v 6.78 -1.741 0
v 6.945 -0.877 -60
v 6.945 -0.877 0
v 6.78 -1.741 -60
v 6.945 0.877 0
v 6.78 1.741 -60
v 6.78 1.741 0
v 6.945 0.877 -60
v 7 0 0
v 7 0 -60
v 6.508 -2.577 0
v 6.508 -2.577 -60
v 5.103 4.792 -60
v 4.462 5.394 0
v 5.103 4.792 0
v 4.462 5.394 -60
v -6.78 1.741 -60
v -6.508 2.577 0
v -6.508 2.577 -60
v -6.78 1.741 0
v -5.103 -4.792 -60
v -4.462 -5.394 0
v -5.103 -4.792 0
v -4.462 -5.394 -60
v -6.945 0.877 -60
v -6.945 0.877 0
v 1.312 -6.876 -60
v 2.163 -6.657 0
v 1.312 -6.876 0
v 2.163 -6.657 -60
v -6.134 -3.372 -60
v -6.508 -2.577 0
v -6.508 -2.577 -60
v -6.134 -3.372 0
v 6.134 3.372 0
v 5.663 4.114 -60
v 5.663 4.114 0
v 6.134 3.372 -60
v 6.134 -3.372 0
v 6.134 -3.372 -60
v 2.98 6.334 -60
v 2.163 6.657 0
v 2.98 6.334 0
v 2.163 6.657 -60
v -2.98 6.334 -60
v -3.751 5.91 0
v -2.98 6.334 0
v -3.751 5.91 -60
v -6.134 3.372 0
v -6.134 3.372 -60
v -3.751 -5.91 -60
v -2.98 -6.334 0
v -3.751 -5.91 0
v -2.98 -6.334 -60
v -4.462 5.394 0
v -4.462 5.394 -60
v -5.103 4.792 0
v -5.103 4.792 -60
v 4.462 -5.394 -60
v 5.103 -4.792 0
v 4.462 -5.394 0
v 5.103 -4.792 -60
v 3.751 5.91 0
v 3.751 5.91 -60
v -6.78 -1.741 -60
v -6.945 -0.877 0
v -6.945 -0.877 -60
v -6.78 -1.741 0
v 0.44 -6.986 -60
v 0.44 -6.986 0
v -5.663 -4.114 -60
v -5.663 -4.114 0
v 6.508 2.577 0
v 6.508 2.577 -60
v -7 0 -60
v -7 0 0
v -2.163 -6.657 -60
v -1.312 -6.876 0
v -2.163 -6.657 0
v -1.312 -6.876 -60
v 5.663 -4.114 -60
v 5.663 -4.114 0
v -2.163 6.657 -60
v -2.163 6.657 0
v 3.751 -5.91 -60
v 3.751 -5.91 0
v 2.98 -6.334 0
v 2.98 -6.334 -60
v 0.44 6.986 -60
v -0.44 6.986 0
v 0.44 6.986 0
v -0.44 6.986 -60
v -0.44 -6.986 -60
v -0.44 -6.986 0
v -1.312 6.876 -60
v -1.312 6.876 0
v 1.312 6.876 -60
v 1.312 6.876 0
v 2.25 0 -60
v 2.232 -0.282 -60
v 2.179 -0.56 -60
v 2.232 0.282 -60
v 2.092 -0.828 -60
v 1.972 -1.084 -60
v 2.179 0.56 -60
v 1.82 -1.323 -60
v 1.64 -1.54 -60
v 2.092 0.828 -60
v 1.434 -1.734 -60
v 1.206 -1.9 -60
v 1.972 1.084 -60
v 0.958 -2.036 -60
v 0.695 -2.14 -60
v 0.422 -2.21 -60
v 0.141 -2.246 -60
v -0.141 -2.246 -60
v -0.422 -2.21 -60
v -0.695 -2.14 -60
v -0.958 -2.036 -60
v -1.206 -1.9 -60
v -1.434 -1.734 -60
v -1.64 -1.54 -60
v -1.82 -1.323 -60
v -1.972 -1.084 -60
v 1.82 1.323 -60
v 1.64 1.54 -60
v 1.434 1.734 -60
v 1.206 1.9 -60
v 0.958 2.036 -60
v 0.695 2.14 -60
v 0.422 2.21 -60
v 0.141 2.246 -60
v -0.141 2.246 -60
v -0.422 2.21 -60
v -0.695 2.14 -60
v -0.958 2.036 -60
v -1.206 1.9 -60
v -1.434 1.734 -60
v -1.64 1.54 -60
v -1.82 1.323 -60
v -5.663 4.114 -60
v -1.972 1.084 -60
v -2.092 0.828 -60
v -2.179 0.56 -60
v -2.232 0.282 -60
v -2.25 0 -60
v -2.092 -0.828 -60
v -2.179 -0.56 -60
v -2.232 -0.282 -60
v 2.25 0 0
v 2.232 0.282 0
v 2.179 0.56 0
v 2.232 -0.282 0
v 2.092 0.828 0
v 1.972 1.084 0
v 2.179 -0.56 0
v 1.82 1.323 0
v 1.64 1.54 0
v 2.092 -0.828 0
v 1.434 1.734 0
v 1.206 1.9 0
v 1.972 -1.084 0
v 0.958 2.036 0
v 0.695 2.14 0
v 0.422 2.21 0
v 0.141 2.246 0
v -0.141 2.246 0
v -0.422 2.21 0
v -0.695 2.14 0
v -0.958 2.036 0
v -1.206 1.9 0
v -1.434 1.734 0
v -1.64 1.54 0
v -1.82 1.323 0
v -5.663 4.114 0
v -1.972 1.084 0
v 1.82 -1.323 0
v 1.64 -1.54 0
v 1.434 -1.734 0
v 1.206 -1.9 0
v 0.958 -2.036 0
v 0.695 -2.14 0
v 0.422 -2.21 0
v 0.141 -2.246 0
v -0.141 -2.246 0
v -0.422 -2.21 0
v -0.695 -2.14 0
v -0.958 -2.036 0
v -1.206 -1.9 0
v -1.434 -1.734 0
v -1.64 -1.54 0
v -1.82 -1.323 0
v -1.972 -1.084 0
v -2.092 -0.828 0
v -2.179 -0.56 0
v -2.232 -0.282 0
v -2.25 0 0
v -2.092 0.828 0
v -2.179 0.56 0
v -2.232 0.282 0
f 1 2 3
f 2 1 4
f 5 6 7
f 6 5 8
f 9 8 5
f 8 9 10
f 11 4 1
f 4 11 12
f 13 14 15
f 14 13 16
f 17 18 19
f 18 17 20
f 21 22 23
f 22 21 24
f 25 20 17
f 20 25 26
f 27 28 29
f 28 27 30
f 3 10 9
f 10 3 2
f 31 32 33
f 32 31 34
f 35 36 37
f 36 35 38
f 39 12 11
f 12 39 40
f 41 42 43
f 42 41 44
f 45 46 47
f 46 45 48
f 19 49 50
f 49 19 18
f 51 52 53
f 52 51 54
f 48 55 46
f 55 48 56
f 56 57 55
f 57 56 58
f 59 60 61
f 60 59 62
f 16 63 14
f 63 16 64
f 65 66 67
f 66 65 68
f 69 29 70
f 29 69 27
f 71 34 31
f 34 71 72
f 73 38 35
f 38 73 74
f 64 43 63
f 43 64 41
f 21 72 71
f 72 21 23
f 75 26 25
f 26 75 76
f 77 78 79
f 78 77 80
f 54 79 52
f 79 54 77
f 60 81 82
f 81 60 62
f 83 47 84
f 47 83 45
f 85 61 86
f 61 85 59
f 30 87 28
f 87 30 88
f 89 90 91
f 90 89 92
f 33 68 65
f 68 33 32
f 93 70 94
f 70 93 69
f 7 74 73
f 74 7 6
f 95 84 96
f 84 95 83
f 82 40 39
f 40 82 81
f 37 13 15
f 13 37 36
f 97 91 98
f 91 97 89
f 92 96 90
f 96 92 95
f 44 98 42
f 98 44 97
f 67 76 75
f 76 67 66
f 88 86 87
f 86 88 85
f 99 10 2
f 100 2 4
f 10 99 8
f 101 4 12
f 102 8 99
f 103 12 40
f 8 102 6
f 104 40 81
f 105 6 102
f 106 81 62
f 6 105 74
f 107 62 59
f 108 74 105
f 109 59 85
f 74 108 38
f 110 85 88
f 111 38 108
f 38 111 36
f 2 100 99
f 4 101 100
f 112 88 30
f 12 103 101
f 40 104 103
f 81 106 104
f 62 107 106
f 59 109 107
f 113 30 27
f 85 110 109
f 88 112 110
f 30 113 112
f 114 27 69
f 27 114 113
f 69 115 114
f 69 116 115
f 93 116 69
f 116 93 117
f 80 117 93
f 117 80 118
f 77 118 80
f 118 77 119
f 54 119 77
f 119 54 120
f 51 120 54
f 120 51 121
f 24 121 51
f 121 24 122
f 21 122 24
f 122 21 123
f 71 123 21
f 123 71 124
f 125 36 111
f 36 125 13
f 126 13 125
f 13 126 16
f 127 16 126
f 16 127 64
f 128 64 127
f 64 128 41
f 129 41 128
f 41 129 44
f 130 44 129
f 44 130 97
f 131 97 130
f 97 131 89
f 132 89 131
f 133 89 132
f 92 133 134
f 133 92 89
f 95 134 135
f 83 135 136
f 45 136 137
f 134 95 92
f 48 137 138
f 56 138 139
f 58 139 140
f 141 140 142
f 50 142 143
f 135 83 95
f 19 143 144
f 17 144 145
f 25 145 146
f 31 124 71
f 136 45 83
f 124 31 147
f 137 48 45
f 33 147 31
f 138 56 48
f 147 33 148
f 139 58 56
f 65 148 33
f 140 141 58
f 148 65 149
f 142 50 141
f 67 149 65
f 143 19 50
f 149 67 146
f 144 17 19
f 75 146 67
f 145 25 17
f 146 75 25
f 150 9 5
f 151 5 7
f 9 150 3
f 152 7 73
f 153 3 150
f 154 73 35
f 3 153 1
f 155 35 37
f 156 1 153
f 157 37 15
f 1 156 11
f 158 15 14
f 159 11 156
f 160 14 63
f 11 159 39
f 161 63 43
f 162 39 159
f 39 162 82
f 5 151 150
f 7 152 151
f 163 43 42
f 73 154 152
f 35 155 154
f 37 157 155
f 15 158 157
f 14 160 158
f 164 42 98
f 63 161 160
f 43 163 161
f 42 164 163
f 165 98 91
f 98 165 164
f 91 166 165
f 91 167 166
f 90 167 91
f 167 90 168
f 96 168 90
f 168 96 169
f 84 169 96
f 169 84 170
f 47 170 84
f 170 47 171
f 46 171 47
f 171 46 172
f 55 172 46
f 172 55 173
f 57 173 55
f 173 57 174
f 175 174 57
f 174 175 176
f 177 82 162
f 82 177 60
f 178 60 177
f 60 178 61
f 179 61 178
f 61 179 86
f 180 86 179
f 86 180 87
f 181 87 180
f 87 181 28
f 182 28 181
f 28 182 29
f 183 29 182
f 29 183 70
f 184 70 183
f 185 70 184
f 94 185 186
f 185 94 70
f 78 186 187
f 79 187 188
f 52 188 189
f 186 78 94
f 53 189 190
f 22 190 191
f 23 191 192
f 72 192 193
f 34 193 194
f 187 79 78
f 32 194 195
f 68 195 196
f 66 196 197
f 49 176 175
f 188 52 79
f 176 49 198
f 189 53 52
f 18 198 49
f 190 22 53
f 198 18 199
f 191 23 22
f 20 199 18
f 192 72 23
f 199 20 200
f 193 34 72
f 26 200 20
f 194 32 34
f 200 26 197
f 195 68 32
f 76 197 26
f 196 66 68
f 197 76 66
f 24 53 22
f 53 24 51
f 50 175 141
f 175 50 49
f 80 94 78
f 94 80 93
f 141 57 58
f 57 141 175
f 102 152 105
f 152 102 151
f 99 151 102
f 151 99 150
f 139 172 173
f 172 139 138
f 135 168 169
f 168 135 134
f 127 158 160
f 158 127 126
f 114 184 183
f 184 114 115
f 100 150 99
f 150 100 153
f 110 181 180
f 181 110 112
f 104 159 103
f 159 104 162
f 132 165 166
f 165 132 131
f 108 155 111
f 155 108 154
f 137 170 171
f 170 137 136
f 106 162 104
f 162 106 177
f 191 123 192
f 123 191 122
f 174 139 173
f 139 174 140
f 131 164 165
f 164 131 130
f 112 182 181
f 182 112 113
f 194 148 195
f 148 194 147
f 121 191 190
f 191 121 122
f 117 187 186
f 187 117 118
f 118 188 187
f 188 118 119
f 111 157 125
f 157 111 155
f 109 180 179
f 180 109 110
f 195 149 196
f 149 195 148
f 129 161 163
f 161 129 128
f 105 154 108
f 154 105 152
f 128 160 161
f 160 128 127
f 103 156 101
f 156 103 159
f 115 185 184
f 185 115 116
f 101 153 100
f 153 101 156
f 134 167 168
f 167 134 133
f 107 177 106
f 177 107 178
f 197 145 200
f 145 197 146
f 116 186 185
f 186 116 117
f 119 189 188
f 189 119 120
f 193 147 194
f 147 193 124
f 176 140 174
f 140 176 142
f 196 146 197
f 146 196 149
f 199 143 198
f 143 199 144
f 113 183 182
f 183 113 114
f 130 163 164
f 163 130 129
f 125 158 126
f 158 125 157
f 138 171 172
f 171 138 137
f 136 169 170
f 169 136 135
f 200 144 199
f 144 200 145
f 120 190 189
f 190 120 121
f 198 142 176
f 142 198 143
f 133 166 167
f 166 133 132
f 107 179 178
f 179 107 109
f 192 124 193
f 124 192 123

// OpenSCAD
$fn = 50;


difference() {
	union() {
		translate(v = [0, 0, -60.0000000000]) {
			cylinder(h = 60, r = 7.0000000000);
		}
		cylinder(h = 0, r = 17.0000000000);
	}
	union() {
		#translate(v = [0, 0, -60]) {
			cylinder(h = 60, r = 2.2500000000);
		}
	}
}
